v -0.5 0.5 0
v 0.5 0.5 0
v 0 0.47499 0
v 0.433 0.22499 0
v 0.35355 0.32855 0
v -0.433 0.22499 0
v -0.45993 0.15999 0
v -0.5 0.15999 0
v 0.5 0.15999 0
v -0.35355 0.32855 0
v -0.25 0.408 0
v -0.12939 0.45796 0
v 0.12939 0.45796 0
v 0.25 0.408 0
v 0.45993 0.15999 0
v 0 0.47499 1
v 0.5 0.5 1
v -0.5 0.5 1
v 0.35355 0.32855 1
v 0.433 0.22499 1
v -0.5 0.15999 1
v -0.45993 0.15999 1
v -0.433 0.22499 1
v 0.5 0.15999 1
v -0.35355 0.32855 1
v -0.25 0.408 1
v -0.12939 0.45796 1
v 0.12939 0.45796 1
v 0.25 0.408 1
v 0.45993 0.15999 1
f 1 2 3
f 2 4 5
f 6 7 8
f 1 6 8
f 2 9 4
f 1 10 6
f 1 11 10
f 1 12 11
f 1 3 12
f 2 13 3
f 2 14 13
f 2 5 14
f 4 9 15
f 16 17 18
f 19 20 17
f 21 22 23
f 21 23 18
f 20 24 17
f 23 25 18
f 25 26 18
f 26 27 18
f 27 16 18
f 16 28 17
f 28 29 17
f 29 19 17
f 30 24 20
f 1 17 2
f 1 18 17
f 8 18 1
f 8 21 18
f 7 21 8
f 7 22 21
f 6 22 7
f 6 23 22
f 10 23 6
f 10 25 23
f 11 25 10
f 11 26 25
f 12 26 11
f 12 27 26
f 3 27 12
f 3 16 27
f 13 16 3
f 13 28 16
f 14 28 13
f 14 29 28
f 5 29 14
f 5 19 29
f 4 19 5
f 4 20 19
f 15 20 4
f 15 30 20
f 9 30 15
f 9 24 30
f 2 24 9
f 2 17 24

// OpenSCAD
// Carousel Autoloader 0.2.23 - bustle cross clamp (dwarsklem) saddle on unit calibre, z width 1.
// Mirror of the cradle: the upper cusps of a top-layer cell, flush with the top of the round,
// so a clamp row lies inside the rack bounds even when the rounds fill the full height.
h = 0.34; eps = 0.025;
fn = 24;      // 24 (default) or 8 (light level for very full racks, matches the 8-sided rounds)
linear_extrude(height = 1)
  difference() {
    translate([-0.5, 0.5 - h]) square([1, h]);
    translate([0, -eps]) circle(r = 0.5, $fn = fn);
  }
